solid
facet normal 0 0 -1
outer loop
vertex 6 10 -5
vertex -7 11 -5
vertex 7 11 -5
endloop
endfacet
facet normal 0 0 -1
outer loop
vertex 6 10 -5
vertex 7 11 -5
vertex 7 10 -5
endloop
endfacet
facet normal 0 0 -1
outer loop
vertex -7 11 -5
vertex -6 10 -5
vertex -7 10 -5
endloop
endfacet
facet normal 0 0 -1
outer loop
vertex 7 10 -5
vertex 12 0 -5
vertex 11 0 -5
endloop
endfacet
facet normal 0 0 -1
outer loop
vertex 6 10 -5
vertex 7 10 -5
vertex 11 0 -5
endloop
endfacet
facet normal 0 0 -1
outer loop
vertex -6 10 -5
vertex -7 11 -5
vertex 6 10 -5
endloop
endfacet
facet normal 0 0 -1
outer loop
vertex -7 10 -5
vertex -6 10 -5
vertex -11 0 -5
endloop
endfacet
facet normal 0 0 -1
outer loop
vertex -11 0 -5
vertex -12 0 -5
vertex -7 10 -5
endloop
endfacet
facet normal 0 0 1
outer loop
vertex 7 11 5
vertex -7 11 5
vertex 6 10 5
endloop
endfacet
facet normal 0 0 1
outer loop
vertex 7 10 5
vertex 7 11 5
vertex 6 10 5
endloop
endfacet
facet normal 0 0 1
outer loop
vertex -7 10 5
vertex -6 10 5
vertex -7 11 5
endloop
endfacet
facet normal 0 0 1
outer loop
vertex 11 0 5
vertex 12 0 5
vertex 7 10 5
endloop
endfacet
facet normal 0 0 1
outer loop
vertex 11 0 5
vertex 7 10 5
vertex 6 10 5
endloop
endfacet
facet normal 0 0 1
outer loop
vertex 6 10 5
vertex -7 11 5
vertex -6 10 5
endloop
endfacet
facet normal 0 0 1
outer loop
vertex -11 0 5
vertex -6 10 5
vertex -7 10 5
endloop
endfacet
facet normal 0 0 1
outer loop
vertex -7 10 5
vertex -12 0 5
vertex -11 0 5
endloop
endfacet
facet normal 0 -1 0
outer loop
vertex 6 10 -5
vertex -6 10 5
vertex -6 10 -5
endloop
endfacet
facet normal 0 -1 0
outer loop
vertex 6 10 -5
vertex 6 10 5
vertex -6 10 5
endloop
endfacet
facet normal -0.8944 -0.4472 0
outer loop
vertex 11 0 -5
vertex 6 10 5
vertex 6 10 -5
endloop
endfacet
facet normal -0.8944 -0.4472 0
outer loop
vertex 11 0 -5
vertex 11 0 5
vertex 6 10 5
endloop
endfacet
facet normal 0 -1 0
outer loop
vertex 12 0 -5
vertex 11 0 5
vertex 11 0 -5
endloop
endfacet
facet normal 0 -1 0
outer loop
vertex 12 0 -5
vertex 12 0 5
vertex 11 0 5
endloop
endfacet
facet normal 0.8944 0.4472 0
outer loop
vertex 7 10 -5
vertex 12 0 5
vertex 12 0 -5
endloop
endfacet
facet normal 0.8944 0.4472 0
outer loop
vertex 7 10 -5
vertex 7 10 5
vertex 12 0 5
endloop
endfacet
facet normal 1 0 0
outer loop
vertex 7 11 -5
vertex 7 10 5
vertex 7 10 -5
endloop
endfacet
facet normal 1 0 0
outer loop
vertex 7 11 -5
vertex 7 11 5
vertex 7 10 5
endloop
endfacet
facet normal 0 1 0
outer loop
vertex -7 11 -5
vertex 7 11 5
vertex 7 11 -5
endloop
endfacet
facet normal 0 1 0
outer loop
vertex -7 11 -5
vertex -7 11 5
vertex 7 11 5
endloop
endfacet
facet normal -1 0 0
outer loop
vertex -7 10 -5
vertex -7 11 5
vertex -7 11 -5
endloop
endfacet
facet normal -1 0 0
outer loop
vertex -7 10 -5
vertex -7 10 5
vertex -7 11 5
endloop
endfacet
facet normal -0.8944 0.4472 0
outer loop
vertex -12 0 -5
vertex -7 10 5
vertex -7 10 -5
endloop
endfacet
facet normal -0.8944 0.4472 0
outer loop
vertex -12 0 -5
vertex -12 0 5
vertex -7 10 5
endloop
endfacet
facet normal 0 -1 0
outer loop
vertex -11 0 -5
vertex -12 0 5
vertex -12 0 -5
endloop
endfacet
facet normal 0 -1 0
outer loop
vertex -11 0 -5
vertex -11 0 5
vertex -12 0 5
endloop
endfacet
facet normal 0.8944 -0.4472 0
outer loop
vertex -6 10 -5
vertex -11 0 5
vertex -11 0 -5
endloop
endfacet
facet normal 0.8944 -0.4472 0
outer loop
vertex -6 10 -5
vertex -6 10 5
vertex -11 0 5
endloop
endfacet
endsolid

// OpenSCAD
 
 module base(){
 linear_extrude(height = 10, center = true, convexity = 10, twist = 0)
  polygon( points=[ 
  [-11,0], //0
  [-12,0], //1
  [-7,10], //2
  [-36,10], //3
  [-36,15], //4
  
  [-35,15], //5
  [-35,11], //6
  [35,11], //7 
  [35,15], //8
  [36,15], //9
  
  [36,10], //10
  [7,10], //11
  [12,0], //12
  [11,0], //13
  [6,10], //14
  
  [-6,10], //15
  
  [-7,11], //16
  [7,11]], //17
  
  
  //paths=[[0,1,2,3,4,5,6,7,8,9,10,11,12,13,14,15]],convexity=10);
  
  paths=[[0,1,2,16,17,11,12,13,14,15]],
  convexity=10);
  
  
  }

  base();
